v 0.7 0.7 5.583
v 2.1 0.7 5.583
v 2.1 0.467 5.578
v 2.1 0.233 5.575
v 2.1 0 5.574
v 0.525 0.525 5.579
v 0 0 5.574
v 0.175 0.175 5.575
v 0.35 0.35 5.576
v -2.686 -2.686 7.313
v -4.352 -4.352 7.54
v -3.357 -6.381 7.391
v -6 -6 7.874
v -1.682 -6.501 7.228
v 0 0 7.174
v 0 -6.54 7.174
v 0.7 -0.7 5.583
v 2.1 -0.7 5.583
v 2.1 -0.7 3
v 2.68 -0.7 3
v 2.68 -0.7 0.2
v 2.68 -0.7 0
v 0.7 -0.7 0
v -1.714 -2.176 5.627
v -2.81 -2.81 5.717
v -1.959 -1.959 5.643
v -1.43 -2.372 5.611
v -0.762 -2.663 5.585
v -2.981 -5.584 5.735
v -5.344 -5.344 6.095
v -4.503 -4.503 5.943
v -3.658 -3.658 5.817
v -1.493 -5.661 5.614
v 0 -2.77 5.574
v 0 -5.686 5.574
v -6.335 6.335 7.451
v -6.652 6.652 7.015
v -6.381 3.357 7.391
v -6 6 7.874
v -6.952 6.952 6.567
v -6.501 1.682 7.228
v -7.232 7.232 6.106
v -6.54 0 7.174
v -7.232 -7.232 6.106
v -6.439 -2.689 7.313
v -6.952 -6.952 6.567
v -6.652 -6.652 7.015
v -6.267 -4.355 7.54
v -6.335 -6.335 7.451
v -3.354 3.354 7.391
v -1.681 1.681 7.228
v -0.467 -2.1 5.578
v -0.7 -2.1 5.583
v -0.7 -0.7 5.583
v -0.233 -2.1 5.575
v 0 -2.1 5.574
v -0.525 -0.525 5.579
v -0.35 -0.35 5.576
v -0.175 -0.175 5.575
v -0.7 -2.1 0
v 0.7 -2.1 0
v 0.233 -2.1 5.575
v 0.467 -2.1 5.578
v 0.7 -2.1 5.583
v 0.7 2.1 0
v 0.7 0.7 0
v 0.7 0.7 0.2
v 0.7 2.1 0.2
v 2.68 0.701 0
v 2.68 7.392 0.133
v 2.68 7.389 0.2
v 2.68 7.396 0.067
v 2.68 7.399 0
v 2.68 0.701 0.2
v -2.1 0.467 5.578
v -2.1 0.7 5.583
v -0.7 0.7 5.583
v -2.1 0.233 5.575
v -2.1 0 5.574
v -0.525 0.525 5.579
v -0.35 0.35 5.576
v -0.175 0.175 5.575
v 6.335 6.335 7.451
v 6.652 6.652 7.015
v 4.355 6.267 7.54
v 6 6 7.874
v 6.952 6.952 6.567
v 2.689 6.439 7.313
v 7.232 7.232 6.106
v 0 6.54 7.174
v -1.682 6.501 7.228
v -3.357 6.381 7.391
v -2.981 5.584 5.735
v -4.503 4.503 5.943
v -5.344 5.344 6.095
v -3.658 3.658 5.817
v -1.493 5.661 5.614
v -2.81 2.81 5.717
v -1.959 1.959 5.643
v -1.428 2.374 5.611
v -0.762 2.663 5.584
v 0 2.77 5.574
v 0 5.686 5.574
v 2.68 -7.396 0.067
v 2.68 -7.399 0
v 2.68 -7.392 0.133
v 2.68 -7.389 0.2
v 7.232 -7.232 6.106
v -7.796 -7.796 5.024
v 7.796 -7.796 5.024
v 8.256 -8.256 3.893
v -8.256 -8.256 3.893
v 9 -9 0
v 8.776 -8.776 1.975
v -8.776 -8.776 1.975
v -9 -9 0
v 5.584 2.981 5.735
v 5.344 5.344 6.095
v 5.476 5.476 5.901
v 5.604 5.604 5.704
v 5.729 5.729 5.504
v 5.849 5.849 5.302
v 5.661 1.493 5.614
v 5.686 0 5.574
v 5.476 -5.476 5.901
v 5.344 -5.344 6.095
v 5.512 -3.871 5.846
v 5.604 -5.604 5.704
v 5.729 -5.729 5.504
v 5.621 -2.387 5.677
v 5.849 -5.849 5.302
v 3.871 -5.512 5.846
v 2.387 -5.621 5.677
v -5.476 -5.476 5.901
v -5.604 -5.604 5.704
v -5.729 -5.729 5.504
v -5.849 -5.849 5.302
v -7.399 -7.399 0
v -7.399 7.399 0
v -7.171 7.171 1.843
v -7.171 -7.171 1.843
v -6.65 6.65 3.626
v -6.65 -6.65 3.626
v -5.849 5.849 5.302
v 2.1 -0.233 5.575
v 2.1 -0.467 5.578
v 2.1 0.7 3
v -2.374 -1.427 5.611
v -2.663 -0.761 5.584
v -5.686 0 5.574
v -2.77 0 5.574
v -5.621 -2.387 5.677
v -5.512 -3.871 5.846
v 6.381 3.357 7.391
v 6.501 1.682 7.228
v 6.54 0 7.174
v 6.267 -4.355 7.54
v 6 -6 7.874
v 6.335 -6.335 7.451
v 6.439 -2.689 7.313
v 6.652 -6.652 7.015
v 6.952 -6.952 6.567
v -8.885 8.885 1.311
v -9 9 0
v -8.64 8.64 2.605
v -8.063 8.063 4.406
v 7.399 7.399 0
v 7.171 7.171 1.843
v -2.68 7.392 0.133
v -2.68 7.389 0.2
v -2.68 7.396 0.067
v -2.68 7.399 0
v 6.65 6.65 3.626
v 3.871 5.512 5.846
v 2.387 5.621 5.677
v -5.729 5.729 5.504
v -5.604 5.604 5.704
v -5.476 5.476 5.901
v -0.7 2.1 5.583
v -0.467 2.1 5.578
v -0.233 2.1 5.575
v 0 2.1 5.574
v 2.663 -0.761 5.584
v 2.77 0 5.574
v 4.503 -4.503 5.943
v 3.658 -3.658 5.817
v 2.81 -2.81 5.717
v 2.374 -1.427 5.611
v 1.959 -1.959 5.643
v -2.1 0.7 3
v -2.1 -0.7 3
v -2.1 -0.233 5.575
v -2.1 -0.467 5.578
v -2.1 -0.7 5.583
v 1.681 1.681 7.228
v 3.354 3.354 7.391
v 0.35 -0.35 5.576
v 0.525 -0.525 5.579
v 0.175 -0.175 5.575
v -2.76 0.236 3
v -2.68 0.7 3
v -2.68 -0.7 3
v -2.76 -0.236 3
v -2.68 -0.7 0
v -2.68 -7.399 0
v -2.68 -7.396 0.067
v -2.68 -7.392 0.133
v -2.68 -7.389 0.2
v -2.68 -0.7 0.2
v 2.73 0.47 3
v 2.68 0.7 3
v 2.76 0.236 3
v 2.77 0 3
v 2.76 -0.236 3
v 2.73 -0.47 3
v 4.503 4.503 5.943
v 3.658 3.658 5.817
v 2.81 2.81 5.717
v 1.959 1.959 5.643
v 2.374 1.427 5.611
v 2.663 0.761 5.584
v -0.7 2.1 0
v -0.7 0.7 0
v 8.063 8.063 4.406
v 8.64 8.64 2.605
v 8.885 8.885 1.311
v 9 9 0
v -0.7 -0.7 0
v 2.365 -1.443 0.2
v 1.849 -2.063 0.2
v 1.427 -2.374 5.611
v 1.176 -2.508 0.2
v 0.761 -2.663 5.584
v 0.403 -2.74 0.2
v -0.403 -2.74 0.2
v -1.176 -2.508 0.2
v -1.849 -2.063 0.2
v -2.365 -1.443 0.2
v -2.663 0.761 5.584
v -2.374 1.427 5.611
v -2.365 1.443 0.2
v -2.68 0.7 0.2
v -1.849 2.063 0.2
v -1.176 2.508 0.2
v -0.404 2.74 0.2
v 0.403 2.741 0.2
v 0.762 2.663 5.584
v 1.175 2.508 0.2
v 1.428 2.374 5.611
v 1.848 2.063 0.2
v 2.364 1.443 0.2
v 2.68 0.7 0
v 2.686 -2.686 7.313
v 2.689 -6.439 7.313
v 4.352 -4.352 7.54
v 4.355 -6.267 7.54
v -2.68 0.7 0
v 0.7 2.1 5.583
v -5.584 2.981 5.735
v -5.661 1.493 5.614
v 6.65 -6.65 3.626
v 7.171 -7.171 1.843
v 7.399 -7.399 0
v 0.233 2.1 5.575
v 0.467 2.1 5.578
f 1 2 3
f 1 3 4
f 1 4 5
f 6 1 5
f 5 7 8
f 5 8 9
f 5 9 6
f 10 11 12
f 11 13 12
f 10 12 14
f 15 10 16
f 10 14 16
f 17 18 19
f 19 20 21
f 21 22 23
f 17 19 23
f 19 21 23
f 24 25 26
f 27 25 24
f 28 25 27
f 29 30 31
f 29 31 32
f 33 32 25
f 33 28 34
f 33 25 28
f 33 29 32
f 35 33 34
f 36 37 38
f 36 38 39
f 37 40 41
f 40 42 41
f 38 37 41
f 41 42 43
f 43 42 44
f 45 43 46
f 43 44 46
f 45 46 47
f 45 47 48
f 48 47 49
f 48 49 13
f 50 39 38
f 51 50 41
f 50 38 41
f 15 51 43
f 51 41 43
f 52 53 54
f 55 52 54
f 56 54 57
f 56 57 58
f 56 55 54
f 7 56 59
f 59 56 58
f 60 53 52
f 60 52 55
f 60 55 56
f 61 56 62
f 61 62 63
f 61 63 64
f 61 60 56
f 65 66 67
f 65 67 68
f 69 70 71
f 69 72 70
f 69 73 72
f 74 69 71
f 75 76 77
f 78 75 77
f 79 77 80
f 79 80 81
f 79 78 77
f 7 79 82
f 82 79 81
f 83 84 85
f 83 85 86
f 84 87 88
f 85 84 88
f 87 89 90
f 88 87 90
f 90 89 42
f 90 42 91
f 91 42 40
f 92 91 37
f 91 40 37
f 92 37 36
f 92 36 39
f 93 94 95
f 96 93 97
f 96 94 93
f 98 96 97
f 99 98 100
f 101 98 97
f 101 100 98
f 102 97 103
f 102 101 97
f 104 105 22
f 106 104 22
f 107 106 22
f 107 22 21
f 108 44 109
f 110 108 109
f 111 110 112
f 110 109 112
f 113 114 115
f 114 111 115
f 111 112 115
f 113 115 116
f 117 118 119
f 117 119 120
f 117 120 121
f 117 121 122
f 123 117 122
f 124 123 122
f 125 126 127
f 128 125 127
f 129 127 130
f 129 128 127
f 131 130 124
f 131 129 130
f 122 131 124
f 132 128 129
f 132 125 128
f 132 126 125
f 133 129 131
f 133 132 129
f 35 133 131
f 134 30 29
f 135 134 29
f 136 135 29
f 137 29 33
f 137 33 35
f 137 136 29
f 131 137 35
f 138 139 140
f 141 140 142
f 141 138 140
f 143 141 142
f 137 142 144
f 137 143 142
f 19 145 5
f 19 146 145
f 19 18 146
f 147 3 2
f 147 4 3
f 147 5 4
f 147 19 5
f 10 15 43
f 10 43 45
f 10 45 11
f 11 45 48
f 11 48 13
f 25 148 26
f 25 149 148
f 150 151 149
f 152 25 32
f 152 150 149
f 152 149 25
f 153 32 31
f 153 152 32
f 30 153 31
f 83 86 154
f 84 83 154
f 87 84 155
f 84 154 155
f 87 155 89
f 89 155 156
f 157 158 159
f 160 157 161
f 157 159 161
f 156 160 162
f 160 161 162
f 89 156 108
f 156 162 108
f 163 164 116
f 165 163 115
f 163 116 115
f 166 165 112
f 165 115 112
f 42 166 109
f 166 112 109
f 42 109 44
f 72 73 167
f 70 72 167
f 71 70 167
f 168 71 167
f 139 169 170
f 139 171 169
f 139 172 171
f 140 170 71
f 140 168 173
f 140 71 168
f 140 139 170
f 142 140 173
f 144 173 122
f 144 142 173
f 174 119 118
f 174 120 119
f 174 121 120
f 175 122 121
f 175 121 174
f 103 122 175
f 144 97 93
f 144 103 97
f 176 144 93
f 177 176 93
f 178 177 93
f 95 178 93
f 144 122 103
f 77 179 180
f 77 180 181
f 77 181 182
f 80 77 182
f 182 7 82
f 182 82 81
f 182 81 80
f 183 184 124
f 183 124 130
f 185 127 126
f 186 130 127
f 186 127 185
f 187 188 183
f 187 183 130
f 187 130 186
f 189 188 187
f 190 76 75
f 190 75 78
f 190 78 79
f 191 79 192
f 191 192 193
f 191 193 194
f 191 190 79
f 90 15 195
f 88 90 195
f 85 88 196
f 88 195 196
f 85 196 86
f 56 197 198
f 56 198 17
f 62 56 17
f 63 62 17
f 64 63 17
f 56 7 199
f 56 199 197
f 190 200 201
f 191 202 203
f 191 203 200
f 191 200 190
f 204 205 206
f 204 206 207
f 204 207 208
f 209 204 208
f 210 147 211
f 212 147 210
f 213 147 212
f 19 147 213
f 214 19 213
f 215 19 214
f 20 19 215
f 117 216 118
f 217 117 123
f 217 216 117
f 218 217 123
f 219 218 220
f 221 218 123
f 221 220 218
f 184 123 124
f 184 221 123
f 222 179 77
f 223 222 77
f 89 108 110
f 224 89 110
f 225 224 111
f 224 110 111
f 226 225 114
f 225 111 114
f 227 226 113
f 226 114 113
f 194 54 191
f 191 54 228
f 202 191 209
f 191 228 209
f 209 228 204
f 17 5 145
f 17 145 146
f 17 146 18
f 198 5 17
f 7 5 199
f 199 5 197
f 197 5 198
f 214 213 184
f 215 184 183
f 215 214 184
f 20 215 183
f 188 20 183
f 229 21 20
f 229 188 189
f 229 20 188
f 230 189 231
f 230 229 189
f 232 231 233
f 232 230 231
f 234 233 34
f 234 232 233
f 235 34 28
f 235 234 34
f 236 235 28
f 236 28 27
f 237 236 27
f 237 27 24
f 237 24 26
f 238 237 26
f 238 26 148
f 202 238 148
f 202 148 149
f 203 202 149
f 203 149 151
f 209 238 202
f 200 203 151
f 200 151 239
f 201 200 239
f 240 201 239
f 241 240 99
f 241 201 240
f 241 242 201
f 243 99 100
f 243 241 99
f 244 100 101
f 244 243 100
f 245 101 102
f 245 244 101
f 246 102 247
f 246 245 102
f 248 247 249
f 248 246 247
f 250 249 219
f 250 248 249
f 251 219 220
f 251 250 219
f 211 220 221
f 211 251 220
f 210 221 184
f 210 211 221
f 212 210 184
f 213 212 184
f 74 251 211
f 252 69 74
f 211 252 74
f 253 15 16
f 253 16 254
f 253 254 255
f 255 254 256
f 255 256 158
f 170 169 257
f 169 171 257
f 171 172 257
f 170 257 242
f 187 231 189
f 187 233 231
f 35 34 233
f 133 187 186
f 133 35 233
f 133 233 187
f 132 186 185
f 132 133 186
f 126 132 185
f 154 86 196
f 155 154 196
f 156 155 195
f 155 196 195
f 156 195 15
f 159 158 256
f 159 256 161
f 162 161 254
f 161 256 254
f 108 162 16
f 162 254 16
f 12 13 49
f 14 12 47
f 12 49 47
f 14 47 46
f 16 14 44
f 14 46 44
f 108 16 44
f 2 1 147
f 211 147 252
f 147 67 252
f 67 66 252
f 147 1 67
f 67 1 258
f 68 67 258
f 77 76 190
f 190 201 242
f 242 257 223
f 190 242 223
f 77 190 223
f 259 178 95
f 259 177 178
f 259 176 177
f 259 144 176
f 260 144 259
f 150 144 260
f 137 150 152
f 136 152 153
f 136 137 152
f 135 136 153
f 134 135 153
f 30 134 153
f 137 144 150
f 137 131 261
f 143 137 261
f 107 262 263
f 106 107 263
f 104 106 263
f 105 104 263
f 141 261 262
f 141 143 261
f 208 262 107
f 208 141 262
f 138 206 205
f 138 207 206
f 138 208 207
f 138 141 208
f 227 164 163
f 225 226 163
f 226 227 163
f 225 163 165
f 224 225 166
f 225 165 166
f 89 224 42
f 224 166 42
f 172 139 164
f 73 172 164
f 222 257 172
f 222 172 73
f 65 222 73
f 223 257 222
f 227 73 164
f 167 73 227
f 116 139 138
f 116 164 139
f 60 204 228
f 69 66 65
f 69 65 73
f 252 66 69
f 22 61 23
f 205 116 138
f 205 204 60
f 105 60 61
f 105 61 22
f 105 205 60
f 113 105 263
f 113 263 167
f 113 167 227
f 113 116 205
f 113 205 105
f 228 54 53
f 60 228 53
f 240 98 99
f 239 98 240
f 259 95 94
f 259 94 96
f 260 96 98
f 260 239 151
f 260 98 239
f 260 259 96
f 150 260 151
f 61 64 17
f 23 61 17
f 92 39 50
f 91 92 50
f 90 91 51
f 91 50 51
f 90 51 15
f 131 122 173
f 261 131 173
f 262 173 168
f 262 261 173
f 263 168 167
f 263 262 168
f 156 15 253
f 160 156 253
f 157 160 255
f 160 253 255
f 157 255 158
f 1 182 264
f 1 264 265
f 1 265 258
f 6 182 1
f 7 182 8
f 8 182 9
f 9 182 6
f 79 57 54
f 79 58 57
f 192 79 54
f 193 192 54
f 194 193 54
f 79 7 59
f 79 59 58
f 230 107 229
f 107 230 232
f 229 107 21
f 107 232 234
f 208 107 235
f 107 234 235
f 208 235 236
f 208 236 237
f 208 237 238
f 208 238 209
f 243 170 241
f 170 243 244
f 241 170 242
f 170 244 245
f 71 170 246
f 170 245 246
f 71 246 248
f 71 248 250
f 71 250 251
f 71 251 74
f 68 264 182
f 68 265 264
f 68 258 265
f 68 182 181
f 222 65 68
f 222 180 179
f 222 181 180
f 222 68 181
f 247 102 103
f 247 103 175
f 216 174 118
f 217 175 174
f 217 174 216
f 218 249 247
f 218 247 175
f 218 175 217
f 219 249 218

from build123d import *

# Parameters (mm, degrees)
F0_W      = 18
F0_H      = 18
F1_DEPTH  = 7.874
F4_DEPTH  = 25
F5_DEPTH  = 25
F6_T      = -1.6
F7_R      = 2.77
F8_DEPTH  = 7
F10_DEPTH = 3
F12_DEPTH = 0.2
F13_DEPTH = 1
F14_DEPTH = 1


with BuildPart() as f1:
    # F0 (on Top) → F1 (new body)
    with BuildSketch(Plane.XY):
        Rectangle(F0_W, F0_H)
    extrude(amount=F1_DEPTH)

    # F3 (on face) → F4 (cut)
    with BuildSketch(Plane(origin=(-9, 0, 0), x_dir=(0, -1, 0), z_dir=(-1, 0, 0))):
        with BuildLine():
            Line((-6, 7.874), (-9, 7.874))
            Line((-9, 7.874), (-7.232233047, 6.106233047))
            ThreePointArc((-7.232233047, 6.106233047), (-6.6524748606, 7.0154603305), (-6, 7.874))
        make_face()
        with BuildLine():
            Line((-7.232233047, 6.106233047), (-9, 7.874))
            Line((-9, 7.874), (-9, 0))
            ThreePointArc((-9, 0), (-8.491581374, 3.1618143655), (-7.232233047, 6.106233047))
        make_face()
        with BuildLine():
            Line((0, 7.874), (-6, 7.874))
            ThreePointArc((-6, 7.874), (-3.0203476621, 7.3495914676), (0, 7.174))
            Line((0, 7.174), (0, 7.874))
        make_face()
        with BuildLine():
            Line((0, 7.874), (0, 7.174))
            ThreePointArc((0, 7.174), (3.0203476621, 7.3495914676), (6, 7.874))
            Line((6, 7.874), (0, 7.874))
        make_face()
        with BuildLine():
            Line((9, 7.874), (6, 7.874))
            ThreePointArc((6, 7.874), (6.6524748606, 7.0154603305), (7.232233047, 6.106233047))
            Line((7.232233047, 6.106233047), (9, 7.874))
        make_face()
        with BuildLine():
            ThreePointArc((7.232233047, 6.106233047), (8.491581374, 3.1618143655), (9, 0))
            Line((9, 0), (9, 7.874))
            Line((9, 7.874), (7.232233047, 6.106233047))
        make_face()
    extrude(amount=-F4_DEPTH, mode=Mode.SUBTRACT)

    # F2 (on face) → F5 (cut)
    with BuildSketch(Plane.XZ.offset(9)):
        with BuildLine():
            Line((-7.232233047, 6.106233047), (-9, 7.874))
            Line((-9, 7.874), (-9, 0))
            ThreePointArc((-9, 0), (-8.491581374, 3.1618143655), (-7.232233047, 6.106233047))
        make_face()
        with BuildLine():
            Line((-6, 7.874), (-9, 7.874))
            Line((-9, 7.874), (-7.232233047, 6.106233047))
            ThreePointArc((-7.232233047, 6.106233047), (-6.6524748606, 7.0154603305), (-6, 7.874))
        make_face()
        with BuildLine():
            Line((6, 7.874), (0, 7.874))
            Line((0, 7.874), (0, 7.174))
            ThreePointArc((0, 7.174), (3.0203476621, 7.3495914676), (6, 7.874))
        make_face()
        with BuildLine():
            Line((0, 7.874), (-6, 7.874))
            ThreePointArc((-6, 7.874), (-3.0203476621, 7.3495914676), (0, 7.174))
            Line((0, 7.174), (0, 7.874))
        make_face()
        with BuildLine():
            Line((9, 7.874), (6, 7.874))
            ThreePointArc((6, 7.874), (6.6524748606, 7.0154603305), (7.232233047, 6.106233047))
            Line((7.232233047, 6.106233047), (9, 7.874))
        make_face()
        with BuildLine():
            ThreePointArc((7.232233047, 6.106233047), (8.491581374, 3.1618143655), (9, 0))
            Line((9, 0), (9, 7.874))
            Line((9, 7.874), (7.232233047, 6.106233047))
        make_face()
    extrude(amount=-F5_DEPTH, mode=Mode.SUBTRACT)

    # F6
    f6_openings = [f1.faces().sort_by_distance(p)[0] for p in [
        (0, 0, 0),
    ]]
    offset(amount=F6_T, openings=f6_openings)

    # F7 (on face) → F8 (join)
    with BuildSketch(Plane(origin=(0, 0, 0), x_dir=(1, 0, 0), z_dir=(0, 0, -1))):
        Circle(F7_R)
        Polygon((0.7, 2.1), (0.7, 0.7), (2.1, 0.7), (2.1, 0), (2.1, -0.7), (0.7, -0.7), (0.7, -2.1), (0, -2.1), (-0.7, -2.1), (-0.7, -0.7), (-2.1, -0.7), (-2.1, 0), (-2.1, 0.7), (-0.7, 0.7), (-0.7, 2.1), (0, 2.1), align=None, mode=Mode.SUBTRACT)
    extrude(amount=-F8_DEPTH)

    # F9 (on face) → F10 (cut)
    with BuildSketch(Plane(origin=(0, 0, 0), x_dir=(1, 0, 0), z_dir=(0, 0, -1))):
        with BuildLine():
            Line((-2.1, -0.7), (-2.1, 0.7))
            Line((-2.1, 0.7), (-2.680093282, 0.7))
            ThreePointArc((-2.680093282, 0.7), (-2.77, 0), (-2.680093282, -0.7))
            Line((-2.680093282, -0.7), (-2.1, -0.7))
        make_face()
        with BuildLine():
            ThreePointArc((2.77, 0), (2.7474313814, 0.3528750551), (2.680093282, 0.7))
            Line((2.680093282, 0.7), (2.1, 0.7))
            Line((2.1, 0.7), (2.1, -0.7))
            Line((2.1, -0.7), (2.680093282, -0.7))
            ThreePointArc((2.680093282, -0.7), (2.7474313814, -0.3528750551), (2.77, 0))
        make_face()
    extrude(amount=-F10_DEPTH, mode=Mode.SUBTRACT)

    # F11 (on face) → F12 (join)
    with BuildSketch(Plane(origin=(0, 0, 0), x_dir=(1, 0, 0), z_dir=(0, 0, -1))):
        with BuildLine():
            ThreePointArc((-2.680093282, 0.7), (0, 2.77), (2.680093282, 0.7))
            Line((2.680093282, 0.7), (2.680093282, 6.7))
            Line((2.680093282, 6.7), (-2.680093282, 6.7))
            Line((-2.680093282, 6.7), (-2.680093282, 0.7))
        make_face()
        Polygon((-0.700093282, -0.7), (-2.680093282, -0.7), (-2.680093282, -6.7), (2.679906718, -6.7), (2.679906718, -0.7), (0.699906718, -0.7), (0.699906718, -2.1), (-0.700093282, -2.1), align=None)
    extrude(amount=-F12_DEPTH)

    # F13 (add): a face of the model
    f13_faces = [f1.faces().sort_by_distance(p)[0] for p in [
        (0, -6.7, 0.1),
    ]]
    extrude(f13_faces, amount=F13_DEPTH)

    # F14 (add): a face of the model
    f14_faces = [f1.faces().sort_by_distance(p)[0] for p in [
        (-9.3282e-05, 6.7, 0.1),
    ]]
    extrude(f14_faces, amount=F14_DEPTH)


solid = f1.part
